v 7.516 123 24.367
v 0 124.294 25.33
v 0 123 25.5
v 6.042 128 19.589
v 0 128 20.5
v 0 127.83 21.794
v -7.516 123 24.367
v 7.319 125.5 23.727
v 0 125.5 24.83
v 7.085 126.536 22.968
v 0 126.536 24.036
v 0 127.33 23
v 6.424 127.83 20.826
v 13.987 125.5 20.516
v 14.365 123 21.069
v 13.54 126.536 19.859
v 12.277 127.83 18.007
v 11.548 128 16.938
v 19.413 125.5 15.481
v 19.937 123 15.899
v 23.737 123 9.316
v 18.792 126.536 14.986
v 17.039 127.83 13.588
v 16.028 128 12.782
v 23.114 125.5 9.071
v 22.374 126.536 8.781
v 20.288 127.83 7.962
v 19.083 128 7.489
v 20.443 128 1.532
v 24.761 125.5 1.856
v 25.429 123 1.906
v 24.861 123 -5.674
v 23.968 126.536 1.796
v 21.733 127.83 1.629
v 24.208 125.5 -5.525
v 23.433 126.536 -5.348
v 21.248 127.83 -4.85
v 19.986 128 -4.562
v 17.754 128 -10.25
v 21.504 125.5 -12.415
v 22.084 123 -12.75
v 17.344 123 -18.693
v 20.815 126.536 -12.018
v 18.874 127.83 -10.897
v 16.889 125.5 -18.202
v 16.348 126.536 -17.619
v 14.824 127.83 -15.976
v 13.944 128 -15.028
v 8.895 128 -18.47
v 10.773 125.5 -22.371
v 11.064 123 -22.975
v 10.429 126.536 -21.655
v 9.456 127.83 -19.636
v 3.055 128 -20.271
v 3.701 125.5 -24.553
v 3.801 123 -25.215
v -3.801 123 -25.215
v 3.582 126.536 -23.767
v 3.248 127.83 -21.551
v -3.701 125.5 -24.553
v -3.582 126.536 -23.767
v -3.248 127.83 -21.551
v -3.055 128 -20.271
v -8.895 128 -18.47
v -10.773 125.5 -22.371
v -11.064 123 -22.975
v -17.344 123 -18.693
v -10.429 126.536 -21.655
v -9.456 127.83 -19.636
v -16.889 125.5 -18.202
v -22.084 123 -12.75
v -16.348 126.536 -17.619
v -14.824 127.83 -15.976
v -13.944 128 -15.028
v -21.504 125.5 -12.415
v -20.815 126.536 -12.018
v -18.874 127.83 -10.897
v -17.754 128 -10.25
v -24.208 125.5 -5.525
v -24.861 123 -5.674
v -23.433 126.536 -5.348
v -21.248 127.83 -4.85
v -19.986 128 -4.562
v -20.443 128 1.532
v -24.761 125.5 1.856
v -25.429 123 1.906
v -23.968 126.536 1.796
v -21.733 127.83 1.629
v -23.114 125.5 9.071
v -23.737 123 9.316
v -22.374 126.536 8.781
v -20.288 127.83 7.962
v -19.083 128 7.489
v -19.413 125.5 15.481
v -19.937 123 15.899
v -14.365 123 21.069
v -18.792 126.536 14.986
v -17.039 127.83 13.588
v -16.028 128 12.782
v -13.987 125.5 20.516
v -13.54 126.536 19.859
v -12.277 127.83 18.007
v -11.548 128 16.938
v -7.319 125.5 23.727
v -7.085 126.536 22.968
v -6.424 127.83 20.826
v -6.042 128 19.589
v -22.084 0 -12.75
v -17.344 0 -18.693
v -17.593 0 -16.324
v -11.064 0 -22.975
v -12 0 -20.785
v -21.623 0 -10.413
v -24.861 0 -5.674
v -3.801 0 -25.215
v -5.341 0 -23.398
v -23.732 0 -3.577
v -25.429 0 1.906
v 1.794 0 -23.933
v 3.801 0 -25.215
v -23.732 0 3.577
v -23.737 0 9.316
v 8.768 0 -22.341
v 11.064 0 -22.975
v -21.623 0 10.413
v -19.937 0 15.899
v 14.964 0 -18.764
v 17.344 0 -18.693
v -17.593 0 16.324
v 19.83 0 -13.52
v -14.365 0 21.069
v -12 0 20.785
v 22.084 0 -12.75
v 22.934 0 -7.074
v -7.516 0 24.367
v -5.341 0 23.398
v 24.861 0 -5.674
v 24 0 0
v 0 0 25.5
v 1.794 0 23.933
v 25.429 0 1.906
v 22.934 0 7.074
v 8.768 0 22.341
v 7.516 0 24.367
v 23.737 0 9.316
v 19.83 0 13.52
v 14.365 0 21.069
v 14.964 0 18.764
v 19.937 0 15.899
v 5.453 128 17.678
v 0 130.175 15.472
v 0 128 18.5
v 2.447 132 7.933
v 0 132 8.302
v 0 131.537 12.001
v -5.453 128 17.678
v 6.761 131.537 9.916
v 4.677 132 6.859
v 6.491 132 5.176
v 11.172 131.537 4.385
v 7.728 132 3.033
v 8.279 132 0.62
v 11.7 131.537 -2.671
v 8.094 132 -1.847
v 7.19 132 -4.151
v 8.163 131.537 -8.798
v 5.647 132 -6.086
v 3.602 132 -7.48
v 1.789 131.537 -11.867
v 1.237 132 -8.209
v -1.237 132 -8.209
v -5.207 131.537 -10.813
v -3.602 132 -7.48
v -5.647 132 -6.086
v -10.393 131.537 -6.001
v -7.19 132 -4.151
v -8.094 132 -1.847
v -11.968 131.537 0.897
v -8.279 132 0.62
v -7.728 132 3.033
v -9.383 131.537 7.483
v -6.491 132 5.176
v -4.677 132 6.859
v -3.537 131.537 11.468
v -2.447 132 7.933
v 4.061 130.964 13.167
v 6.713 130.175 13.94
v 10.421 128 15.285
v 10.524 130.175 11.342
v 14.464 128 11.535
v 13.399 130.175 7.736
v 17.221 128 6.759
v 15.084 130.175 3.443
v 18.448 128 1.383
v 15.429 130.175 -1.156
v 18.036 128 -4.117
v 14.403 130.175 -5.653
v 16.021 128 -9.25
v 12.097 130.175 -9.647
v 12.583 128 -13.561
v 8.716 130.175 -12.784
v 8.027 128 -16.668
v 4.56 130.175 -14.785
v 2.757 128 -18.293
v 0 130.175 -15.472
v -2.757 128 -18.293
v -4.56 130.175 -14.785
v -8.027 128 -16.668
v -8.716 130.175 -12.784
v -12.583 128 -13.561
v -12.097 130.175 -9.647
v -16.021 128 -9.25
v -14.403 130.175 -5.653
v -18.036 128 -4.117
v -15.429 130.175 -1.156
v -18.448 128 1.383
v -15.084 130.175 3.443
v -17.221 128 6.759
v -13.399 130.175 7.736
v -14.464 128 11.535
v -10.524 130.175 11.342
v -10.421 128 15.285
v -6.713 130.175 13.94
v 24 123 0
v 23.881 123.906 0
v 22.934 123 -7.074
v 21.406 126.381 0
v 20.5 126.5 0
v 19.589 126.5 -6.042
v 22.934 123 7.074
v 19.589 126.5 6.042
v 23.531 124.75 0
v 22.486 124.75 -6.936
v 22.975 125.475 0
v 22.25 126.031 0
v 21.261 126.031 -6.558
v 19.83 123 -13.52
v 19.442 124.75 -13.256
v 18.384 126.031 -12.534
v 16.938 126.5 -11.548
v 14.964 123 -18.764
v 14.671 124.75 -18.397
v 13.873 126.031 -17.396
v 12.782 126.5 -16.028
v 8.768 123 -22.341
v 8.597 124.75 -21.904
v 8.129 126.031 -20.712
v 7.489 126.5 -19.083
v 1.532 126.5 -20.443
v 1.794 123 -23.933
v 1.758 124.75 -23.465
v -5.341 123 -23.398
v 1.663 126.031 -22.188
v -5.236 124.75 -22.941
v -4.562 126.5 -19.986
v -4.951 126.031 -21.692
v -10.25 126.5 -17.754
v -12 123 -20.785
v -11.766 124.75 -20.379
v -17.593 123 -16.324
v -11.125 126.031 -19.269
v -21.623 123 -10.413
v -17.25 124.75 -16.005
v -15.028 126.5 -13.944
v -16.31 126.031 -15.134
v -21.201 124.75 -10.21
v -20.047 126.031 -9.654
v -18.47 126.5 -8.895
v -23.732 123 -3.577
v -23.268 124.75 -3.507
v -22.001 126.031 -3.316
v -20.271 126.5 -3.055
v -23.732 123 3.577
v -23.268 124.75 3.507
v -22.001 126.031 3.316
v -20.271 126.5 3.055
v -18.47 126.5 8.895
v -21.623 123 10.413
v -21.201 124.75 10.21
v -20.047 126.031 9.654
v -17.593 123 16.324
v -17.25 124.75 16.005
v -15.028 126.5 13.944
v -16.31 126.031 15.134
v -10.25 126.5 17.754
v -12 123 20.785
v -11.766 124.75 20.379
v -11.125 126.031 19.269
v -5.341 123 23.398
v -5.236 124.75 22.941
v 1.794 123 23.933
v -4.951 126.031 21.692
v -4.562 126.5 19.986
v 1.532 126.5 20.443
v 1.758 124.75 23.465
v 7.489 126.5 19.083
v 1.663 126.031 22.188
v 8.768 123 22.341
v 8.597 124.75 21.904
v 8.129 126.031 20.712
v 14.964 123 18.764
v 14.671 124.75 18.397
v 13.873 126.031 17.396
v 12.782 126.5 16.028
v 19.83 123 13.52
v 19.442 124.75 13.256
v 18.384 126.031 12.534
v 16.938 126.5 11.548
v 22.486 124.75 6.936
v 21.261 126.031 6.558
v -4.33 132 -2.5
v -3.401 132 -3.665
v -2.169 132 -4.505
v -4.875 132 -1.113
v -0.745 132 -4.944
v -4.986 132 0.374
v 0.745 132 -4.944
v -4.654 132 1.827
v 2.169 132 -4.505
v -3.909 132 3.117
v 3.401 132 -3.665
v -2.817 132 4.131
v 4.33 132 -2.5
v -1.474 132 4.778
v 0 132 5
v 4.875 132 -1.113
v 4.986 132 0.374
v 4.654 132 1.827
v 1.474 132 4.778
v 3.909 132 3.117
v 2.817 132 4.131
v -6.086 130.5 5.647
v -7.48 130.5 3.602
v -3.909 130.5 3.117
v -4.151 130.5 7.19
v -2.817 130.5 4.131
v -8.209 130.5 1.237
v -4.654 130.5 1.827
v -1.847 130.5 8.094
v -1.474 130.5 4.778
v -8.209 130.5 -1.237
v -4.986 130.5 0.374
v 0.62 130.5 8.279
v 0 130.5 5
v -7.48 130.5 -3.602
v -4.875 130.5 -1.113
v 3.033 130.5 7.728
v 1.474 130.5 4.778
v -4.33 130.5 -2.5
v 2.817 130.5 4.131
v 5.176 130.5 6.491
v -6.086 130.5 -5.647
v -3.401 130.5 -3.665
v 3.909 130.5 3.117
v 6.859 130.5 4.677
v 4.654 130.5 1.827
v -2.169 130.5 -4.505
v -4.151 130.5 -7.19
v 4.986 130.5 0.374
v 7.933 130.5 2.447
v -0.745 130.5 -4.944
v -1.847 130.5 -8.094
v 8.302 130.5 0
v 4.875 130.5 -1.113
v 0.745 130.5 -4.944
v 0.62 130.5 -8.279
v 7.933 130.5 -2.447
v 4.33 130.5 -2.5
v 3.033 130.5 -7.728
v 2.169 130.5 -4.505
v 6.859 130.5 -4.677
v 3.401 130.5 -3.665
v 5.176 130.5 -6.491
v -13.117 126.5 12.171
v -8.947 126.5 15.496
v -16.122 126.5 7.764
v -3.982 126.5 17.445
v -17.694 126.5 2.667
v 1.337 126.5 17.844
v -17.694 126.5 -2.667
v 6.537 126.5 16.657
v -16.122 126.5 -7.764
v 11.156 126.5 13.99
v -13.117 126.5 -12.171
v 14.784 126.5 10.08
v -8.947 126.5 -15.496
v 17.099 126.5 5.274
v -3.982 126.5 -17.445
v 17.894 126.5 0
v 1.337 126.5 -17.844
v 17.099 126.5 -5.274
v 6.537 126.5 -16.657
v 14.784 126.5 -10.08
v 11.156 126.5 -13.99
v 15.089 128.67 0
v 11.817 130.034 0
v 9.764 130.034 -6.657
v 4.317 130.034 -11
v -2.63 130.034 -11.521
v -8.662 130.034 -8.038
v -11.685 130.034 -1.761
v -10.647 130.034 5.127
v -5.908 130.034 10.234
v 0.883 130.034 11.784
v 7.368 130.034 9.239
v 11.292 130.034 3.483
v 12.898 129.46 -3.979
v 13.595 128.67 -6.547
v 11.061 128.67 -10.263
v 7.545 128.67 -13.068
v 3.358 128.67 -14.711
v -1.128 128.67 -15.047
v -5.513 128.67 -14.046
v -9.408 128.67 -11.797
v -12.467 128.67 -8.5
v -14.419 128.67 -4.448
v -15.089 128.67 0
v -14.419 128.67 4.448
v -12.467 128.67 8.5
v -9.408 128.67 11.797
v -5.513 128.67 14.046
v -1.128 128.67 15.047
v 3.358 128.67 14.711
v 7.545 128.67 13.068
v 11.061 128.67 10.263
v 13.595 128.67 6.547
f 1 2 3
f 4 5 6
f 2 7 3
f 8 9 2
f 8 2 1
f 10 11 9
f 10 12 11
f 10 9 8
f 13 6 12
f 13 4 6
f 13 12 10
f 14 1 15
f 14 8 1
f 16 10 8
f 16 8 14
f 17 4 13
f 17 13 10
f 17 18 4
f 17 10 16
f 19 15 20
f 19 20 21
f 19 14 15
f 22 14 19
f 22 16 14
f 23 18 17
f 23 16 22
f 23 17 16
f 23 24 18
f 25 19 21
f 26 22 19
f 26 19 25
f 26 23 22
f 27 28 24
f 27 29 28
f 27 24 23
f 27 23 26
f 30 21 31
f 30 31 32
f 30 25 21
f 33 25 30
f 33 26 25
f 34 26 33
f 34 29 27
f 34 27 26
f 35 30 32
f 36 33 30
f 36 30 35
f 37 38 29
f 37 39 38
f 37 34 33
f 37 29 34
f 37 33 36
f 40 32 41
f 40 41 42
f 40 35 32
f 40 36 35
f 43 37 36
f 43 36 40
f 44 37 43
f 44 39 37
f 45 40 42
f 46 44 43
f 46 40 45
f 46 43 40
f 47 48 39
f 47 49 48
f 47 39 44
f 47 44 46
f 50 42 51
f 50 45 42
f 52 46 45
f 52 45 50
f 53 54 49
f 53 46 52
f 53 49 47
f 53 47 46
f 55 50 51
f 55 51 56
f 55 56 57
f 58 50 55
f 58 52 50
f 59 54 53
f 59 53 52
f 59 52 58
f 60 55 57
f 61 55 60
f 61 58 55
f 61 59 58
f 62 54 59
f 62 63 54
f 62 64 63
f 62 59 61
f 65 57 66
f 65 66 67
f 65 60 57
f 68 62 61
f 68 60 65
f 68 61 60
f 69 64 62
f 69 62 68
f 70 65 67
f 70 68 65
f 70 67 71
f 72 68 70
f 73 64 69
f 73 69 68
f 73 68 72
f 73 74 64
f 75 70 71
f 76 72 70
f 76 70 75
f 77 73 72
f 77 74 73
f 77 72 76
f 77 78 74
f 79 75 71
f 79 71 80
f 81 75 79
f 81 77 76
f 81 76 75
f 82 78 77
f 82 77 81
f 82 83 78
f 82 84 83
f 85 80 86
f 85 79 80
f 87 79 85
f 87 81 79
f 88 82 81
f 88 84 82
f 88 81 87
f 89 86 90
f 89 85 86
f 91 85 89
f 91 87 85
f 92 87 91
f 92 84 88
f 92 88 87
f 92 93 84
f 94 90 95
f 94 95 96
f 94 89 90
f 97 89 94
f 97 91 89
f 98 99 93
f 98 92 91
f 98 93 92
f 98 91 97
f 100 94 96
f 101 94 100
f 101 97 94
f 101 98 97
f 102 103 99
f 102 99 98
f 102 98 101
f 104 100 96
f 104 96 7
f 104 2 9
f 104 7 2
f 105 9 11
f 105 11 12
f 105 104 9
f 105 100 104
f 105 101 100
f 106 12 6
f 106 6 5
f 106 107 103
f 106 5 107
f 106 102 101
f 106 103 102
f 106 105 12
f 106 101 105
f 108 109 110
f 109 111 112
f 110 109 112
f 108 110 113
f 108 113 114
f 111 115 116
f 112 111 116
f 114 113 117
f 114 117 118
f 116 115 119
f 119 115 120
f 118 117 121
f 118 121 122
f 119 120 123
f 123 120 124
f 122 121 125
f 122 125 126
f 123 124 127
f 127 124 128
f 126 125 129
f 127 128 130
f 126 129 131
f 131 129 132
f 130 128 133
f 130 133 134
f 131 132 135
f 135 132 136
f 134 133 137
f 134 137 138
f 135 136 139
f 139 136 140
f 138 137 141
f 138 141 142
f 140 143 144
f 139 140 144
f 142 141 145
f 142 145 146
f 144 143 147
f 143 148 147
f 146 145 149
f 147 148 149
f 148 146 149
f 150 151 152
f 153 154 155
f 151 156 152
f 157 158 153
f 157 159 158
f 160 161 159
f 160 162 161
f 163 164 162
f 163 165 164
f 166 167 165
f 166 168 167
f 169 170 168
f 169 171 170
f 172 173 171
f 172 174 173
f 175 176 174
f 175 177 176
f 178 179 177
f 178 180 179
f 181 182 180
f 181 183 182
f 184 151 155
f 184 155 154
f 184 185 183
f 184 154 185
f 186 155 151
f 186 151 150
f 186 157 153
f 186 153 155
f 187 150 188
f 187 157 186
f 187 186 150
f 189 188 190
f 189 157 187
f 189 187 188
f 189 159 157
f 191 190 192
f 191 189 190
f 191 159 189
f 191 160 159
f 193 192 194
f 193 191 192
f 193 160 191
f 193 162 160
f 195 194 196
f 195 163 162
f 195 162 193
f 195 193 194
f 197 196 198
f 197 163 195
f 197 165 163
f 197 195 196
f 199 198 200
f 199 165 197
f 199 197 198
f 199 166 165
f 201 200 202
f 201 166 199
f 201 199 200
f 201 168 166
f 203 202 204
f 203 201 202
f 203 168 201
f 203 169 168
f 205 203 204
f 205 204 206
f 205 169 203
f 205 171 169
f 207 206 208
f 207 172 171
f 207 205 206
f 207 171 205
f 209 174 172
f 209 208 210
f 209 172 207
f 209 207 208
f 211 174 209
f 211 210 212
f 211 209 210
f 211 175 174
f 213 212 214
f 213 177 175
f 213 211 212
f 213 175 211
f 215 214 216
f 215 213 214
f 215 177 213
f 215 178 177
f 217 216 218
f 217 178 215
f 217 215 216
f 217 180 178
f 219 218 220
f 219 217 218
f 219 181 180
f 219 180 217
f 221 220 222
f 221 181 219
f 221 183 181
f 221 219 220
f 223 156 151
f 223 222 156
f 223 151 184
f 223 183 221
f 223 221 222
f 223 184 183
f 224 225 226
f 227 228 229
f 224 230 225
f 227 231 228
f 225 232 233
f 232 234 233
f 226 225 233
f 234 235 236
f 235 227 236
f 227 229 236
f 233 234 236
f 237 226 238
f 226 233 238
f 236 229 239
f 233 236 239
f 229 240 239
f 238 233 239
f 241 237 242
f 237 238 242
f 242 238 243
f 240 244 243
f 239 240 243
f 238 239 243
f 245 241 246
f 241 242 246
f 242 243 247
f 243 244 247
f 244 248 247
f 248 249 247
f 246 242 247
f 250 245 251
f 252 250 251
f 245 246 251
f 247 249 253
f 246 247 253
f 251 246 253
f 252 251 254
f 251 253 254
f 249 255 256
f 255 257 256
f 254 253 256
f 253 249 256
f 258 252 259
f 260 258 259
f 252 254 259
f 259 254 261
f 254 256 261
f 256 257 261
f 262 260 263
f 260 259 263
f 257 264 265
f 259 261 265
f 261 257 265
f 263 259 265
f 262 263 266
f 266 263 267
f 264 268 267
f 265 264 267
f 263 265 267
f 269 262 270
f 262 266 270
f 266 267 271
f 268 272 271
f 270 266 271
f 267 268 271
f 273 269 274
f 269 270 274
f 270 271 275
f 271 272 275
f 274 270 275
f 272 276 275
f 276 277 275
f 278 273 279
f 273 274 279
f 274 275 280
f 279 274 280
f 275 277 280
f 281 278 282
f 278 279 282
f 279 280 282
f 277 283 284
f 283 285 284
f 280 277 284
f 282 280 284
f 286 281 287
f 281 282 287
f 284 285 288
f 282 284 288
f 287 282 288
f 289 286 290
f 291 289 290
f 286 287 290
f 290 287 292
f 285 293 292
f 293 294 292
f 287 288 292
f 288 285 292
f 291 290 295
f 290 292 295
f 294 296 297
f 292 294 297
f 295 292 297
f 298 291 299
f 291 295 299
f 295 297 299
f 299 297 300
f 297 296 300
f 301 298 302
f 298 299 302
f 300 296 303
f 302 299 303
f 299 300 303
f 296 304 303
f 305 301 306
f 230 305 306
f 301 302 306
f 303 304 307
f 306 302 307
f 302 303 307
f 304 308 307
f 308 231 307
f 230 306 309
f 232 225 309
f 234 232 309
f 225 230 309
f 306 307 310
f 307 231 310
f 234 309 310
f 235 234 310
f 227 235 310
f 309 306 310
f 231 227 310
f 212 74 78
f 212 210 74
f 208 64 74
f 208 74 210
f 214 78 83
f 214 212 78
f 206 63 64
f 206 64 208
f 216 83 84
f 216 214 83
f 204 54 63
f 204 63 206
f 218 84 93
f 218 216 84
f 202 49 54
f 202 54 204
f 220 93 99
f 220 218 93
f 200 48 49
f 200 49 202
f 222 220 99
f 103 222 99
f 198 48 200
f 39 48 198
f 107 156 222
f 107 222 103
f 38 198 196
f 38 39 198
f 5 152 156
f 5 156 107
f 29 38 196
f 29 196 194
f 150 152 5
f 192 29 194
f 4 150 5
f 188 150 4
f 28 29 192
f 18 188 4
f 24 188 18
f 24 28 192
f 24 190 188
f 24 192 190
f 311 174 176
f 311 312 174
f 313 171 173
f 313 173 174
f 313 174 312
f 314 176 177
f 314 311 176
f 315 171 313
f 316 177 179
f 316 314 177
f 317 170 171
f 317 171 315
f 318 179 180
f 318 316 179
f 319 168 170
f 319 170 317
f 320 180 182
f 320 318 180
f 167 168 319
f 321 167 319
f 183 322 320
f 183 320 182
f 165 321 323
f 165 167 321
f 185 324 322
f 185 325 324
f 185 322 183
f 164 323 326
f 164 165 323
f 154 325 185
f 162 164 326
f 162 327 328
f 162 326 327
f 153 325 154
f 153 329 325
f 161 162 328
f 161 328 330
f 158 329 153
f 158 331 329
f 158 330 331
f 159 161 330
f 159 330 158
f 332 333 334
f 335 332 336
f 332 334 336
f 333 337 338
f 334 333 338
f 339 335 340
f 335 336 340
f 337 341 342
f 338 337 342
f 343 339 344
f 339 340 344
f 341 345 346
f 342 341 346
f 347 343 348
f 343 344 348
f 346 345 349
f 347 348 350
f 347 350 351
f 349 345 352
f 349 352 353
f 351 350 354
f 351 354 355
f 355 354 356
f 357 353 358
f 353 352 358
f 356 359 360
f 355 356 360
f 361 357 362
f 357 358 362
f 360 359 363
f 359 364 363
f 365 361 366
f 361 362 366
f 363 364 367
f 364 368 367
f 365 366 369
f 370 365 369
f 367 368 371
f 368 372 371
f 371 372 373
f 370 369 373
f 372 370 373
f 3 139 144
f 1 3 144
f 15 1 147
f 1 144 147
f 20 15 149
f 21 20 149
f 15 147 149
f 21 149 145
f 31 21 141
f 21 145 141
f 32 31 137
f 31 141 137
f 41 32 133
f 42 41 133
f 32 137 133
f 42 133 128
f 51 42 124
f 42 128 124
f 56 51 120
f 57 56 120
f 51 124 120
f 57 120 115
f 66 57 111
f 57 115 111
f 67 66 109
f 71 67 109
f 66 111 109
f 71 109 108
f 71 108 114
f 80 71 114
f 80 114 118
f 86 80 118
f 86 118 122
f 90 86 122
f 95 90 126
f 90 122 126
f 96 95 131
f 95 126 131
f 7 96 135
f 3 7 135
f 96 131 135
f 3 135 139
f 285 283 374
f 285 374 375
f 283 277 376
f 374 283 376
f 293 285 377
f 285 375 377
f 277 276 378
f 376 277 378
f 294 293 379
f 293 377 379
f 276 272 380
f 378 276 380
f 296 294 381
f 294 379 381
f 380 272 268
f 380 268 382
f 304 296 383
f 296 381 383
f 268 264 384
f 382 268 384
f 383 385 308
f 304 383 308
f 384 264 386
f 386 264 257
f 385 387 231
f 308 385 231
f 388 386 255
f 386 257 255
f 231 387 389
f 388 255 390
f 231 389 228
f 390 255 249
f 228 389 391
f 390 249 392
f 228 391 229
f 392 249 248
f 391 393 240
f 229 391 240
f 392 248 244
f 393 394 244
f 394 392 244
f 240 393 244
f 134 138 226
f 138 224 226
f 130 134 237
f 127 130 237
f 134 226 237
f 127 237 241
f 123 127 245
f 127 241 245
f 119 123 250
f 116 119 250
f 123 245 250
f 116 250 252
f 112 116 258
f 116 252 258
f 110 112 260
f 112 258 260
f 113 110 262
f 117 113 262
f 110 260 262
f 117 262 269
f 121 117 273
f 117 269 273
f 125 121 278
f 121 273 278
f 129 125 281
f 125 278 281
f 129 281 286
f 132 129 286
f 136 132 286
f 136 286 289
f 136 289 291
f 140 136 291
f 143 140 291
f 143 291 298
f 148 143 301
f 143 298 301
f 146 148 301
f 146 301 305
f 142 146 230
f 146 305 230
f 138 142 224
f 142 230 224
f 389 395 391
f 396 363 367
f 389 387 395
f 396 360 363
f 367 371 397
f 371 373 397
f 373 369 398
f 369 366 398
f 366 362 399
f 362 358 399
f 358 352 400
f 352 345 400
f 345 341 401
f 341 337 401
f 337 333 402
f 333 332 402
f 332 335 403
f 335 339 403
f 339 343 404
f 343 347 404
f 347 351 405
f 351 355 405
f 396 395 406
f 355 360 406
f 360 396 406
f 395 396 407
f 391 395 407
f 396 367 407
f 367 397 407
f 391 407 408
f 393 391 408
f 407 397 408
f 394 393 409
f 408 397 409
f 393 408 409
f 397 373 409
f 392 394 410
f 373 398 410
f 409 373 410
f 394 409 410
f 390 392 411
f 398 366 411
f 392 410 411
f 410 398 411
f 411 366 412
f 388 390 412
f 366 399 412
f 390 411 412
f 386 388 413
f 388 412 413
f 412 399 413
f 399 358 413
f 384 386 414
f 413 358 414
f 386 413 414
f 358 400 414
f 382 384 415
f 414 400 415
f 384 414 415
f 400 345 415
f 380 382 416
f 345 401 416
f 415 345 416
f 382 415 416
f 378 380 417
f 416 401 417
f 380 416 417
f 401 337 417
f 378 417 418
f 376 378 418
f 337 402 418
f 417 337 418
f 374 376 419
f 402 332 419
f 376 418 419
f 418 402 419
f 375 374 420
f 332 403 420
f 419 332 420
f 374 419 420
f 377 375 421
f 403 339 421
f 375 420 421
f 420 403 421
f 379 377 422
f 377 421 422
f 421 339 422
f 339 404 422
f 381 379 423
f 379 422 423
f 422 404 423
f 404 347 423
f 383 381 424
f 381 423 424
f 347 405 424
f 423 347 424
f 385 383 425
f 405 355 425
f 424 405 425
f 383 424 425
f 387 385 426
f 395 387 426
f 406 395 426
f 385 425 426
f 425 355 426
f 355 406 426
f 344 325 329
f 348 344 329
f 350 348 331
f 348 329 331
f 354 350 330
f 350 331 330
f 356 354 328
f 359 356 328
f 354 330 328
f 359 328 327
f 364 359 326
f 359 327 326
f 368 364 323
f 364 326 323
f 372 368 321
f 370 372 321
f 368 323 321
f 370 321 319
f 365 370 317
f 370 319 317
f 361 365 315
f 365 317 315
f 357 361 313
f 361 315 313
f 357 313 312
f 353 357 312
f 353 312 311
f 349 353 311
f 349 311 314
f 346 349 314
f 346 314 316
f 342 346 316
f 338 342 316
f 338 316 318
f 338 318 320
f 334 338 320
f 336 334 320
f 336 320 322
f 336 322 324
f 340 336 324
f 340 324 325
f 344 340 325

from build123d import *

# Parameters (mm, degrees)
SKETCH1_R           = 25.5
BOSS_EXTRUDE1_DEPTH = 128
FILLET2_R           = 5
SKETCH2_R           = 18.5
BOSS_EXTRUDE2_DEPTH = 4
FILLET5_R           = 15
SKETCH3_R           = 5
CUT_EXTRUDE1_DEPTH  = 137.83749488


# Read off the part's stored shape, not the designer's step: Shell1
with BuildPart() as part:
    # Sketch1 → Boss-Extrude1 (new body)
    with BuildSketch(Plane(origin=(0, 0, 0), x_dir=(1, 0, 0), z_dir=(0, 1, 0))):
        with Locations(Location((0, 0, 0), (0, 0, 270))):
            Circle(SKETCH1_R)
    extrude(amount=BOSS_EXTRUDE1_DEPTH)

    # Fillet2
    fillet2_edges = [part.edges().sort_by_distance(p)[0] for p in [
        (0, 128, -25.5),
    ]]
    fillet(fillet2_edges, radius=FILLET2_R)

    # Sketch2 → Boss-Extrude2 (add)
    with BuildSketch(Plane(origin=(0, 128, 0), x_dir=(1, 0, 0), z_dir=(0, 1, 0))):
        with Locations(Location((0, 0, 0), (0, 0, 270))):
            Circle(SKETCH2_R)
    extrude(amount=BOSS_EXTRUDE2_DEPTH)

    # Fillet5
    # the kernel refuses this fillet: 15 mm, written as the material it takes off along each edge
    with BuildSketch(Plane(origin=(0, 132, 0), x_dir=(0, 0, 1), z_dir=(-1, 0, 0))) as fillet5_piece_1:
        with BuildLine():
            CenterArc((8.301960973, -15), FILLET5_R, 47.166571934, 42.833428066)
            Line((8.301960973, 0), (8.301960973, 0.3))
            Line((8.301960973, 0.3), (18.5, 0.3))
            Line((18.5, 0.3), (18.8, 0))
            ThreePointArc((18.8, 0), (18.8, -2), (18.703960781, -3.78))
            Line((18.703960781, -3.78), (18.5, -4))
        make_face()
    revolve(axis=Axis((0, 132, 0), (0, 1, 0)), mode=Mode.SUBTRACT)

    # Shell1 outline → Shell1 (revolve, cut)
    with BuildSketch(Plane.XY):
        with BuildLine():
            Line((24, 0), (24, 123))
            ThreePointArc((24, 123), (22.974873734, 125.474873734), (20.5, 126.5))
            Line((20.5, 126.5), (17.893624019, 126.5))
            ThreePointArc((17.893624019, 126.5), (13.498113395, 129.459935794), (8.301960973, 130.5))
            Line((8.301960973, 130.5), (0, 130.5))
            Line((0, 130.5), (0, 0))
            Line((0, 0), (24, 0))
        make_face()
    revolve(axis=Axis((0, 0, 0), (0, 1, 0)), mode=Mode.SUBTRACT)

    # Sketch3 → Cut-Extrude1 (cut, through all)
    with BuildSketch(Plane(origin=(0, 132, 0), x_dir=(1, 0, 0), z_dir=(0, 1, 0))):
        with Locations(Location((0, 0, 0), (0, 0, 270))):
            Circle(SKETCH3_R)
    extrude(amount=-CUT_EXTRUDE1_DEPTH, mode=Mode.SUBTRACT)


solid = part.part
